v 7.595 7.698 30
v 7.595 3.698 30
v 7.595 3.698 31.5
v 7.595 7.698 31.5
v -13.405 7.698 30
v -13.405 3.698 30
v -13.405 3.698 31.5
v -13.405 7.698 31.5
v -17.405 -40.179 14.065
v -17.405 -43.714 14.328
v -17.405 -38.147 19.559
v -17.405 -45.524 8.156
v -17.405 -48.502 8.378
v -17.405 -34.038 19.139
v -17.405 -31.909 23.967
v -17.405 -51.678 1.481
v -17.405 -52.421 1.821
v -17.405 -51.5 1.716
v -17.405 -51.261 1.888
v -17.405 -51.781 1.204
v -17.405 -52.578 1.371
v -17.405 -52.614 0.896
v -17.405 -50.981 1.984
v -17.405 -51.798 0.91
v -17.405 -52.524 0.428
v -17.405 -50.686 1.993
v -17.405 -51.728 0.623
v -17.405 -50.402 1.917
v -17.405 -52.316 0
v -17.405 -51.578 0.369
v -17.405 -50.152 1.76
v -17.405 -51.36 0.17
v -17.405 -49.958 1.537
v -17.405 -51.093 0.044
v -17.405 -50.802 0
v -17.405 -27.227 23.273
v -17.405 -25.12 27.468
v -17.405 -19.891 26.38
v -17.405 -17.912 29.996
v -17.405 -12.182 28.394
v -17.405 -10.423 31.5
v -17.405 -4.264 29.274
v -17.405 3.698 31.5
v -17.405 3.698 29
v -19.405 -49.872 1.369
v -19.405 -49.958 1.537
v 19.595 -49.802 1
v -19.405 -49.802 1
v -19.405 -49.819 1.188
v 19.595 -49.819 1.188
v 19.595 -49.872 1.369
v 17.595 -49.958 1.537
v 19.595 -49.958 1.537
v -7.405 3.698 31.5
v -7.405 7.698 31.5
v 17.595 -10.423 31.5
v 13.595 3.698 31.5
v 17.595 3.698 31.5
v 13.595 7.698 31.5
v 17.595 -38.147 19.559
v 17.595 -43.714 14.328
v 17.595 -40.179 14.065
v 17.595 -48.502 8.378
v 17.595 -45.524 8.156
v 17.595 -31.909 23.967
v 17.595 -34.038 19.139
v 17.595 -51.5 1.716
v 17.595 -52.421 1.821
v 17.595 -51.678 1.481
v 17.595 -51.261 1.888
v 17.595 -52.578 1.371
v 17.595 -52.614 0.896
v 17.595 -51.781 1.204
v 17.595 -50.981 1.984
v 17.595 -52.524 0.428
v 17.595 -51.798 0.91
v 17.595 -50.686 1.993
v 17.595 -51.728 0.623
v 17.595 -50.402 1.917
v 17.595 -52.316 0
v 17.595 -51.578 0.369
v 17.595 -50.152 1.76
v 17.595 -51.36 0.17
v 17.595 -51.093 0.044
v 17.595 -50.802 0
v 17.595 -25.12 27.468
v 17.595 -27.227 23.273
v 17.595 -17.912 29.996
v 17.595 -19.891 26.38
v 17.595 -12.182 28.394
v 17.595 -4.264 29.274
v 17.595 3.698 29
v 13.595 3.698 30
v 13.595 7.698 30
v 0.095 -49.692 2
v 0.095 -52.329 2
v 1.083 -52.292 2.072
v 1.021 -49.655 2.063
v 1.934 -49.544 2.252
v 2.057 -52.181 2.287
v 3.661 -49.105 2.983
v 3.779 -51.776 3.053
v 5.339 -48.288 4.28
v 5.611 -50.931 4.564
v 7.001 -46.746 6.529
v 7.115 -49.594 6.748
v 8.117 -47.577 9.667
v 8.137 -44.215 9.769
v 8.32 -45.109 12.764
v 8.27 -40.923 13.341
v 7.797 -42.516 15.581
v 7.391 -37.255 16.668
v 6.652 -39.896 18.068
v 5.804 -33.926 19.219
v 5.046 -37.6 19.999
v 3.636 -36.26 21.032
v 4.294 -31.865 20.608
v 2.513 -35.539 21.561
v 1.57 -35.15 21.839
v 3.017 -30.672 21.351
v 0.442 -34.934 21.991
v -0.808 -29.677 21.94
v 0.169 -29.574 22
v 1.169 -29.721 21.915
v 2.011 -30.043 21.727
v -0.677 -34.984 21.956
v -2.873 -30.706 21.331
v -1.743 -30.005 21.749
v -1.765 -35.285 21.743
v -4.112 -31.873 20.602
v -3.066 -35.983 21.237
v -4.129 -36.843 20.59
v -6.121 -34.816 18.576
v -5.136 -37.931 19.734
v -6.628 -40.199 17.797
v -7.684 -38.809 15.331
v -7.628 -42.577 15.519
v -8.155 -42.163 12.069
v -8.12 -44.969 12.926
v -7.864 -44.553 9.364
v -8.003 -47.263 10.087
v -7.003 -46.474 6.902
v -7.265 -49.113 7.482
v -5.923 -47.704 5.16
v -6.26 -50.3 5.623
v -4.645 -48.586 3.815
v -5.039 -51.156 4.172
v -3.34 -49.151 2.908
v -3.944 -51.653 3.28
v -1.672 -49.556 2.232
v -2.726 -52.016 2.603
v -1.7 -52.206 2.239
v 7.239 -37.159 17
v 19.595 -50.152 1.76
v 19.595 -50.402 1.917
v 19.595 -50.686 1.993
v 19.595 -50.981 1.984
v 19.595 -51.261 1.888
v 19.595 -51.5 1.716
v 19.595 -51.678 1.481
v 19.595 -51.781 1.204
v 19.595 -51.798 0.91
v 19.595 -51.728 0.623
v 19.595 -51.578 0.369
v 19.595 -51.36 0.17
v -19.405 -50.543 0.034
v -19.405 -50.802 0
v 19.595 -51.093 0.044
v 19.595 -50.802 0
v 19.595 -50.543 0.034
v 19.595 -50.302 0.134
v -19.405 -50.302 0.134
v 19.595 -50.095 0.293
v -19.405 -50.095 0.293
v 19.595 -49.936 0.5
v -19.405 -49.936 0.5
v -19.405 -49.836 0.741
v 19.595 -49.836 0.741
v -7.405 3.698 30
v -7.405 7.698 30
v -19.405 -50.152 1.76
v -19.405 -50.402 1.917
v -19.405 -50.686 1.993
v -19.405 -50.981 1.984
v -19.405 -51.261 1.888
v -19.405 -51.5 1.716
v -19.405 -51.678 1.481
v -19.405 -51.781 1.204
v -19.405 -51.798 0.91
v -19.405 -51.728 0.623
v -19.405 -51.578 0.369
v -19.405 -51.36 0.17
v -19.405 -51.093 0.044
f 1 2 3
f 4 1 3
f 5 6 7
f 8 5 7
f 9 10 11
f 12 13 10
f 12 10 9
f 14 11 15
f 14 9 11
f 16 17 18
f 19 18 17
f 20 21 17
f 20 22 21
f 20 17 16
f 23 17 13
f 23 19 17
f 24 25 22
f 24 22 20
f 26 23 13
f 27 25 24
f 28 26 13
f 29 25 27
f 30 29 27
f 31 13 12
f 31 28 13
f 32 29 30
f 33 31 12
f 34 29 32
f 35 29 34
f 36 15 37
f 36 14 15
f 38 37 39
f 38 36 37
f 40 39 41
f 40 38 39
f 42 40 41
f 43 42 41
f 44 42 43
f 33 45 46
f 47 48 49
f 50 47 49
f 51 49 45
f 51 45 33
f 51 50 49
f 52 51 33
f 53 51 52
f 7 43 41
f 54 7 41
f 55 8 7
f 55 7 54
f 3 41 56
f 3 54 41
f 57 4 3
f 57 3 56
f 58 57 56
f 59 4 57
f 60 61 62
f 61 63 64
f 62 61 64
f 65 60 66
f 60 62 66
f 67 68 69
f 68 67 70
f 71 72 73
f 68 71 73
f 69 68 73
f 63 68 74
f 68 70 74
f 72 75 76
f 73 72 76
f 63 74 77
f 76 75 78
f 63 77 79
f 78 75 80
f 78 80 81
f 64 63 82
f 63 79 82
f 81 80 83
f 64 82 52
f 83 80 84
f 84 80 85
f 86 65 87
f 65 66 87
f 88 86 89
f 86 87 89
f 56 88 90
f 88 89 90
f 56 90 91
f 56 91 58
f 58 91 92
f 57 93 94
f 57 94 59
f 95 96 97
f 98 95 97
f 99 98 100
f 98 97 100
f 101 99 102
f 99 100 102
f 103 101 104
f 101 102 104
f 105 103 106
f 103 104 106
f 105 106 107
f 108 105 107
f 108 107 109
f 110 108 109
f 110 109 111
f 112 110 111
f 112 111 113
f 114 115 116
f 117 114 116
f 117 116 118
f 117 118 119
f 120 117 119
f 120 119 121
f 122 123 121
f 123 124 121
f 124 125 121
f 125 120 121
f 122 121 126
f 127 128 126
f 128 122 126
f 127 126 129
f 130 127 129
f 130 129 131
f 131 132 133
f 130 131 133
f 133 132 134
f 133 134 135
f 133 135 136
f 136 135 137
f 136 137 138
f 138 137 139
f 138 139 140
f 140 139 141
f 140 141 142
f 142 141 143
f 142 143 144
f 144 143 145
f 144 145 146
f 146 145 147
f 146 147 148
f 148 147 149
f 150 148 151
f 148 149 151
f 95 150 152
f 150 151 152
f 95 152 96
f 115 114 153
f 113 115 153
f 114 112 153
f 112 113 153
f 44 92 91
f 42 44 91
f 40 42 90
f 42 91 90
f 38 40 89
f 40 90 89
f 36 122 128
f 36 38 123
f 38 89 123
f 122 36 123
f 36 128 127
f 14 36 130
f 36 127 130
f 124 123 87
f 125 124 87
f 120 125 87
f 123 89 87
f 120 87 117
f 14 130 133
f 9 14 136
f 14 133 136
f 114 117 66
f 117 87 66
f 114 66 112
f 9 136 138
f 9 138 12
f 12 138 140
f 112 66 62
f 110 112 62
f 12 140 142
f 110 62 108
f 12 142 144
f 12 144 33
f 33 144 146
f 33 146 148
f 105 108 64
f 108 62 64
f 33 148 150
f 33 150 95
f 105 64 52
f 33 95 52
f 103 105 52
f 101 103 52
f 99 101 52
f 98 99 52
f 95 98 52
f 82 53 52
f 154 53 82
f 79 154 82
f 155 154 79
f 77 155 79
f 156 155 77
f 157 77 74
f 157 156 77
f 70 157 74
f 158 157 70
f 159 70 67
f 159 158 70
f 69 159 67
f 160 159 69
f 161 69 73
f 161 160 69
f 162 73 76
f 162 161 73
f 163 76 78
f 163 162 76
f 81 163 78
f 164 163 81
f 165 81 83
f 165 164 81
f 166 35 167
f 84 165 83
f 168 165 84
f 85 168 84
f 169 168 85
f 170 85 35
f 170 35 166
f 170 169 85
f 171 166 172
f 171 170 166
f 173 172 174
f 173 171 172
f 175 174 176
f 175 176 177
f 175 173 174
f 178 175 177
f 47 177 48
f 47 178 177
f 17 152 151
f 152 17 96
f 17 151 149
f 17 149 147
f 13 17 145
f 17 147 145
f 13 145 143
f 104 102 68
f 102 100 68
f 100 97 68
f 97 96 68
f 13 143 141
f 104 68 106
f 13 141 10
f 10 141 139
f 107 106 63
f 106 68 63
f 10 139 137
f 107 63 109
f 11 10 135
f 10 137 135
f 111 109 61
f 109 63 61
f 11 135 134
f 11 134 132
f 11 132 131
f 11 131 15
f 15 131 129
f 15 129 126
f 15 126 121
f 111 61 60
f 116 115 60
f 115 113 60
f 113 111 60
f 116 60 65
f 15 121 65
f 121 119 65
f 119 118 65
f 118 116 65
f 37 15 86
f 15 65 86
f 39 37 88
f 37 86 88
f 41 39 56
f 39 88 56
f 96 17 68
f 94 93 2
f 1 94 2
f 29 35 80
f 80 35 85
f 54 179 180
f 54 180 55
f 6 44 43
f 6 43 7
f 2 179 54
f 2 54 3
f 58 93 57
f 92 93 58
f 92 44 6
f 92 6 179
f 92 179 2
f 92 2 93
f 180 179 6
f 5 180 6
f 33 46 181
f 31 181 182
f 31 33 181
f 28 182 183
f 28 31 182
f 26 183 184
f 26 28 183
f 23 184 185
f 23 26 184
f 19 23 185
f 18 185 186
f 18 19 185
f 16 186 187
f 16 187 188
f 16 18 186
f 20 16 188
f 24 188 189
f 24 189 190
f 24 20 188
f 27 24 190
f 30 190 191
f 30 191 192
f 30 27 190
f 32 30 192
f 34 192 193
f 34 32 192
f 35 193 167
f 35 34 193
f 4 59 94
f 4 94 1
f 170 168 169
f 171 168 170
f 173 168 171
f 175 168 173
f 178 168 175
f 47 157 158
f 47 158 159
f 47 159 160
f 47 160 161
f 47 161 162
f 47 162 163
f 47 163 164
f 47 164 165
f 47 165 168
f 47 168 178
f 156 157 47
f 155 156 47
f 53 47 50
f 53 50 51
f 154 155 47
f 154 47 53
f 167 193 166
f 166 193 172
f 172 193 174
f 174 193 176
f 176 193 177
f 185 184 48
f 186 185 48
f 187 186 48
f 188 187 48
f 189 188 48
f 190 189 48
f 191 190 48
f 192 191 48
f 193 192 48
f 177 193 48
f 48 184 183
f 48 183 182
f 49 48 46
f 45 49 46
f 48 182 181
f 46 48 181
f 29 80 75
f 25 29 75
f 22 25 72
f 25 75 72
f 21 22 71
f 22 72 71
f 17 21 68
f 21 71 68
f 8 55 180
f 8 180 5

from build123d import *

# Parameters (mm, degrees)
F0_W          = 35
F0_H          = 57
F1_DEPTH      = 31.5
F4_DEPTH      = 57.001
F5_DEPTH      = 35.0010001
F7_DEPTH      = 35.0010001
F9_DEPTH      = 2
F9_DEPTH_BACK = 37
F11_DEPTH     = 37.001
F12_W         = 6
F12_H         = 2.5
F13_DEPTH     = 4
F14_DEPTH     = 1


with BuildPart() as f1:
    # F0 (on Top) → F1 (new body)
    with BuildSketch(Plane.XY):
        with Locations((0.0945744105, -24.8016776452)):
            Rectangle(F0_W, F0_H)
    extrude(amount=F1_DEPTH)

    # F3 (on face) → F4 (cut, through all)
    with BuildSketch(Plane.XZ.offset(53.3016776452)):
        with BuildLine():
            add(Edge.make_bspline(
                [(0.0945744105, 2), (14.3839935729, 2), (7.2392839917, 17), (0.0945744105, 32), (-7.0501351708, 17), (-14.194844752, 2), (0.0945744105, 2)],
                knots=[0, 0, 0, 2.0943951024, 2.0943951024, 4.1887902048, 4.1887902048, 6.2831853072, 6.2831853072, 6.2831853072], degree=2, weights=[1, 0.5, 1, 0.5, 1, 0.5, 1]))
        make_face()
    extrude(amount=-F4_DEPTH, mode=Mode.SUBTRACT)

    # F2 (on face) → F5 (cut, through all)
    with BuildSketch(Plane.YZ.offset(17.5945744105)):
        with BuildLine():
            ThreePointArc((-53.3016776452, 0), (-35.9248296563, 21.279893434), (-10.4231016291, 31.5))
            Line((-10.4231016291, 31.5), (-53.3016776452, 31.5))
            Line((-53.3016776452, 31.5), (-53.3016776452, 0))
        make_face()
    extrude(amount=-F5_DEPTH, mode=Mode.SUBTRACT)

    # F6 (on face) → F7 (cut, through all)
    with BuildSketch(Plane.YZ.offset(17.5945744105)):
        with BuildLine():
            Line((3.6983223548, 0), (3.6983223548, 29))
            ThreePointArc((3.6983223548, 29), (-28.0042777095, 22.8678173622), (-50.8016776452, 0))
            Line((-50.8016776452, 0), (3.6983223548, 0))
        make_face()
    extrude(amount=-F7_DEPTH, mode=Mode.SUBTRACT)

    # F8 (on face) → F9 (join, two sides)
    with BuildSketch(Plane.YZ.offset(17.5945744105)) as f9_sk:
        with BuildLine():
            ThreePointArc((-49.9582016017, 1.5371667936), (-51.6783665277, 1.4810577961), (-50.8016776452, 0))
            ThreePointArc((-50.8016776452, 0), (-50.3860655446, 0.7719448198), (-49.9582016017, 1.5371667936))
        make_face()
        with BuildLine():
            ThreePointArc((-49.9582016017, 1.5371667936), (-50.3860655446, 0.7719448198), (-50.8016776452, 0))
            ThreePointArc((-50.8016776452, 0), (-50.094570864, 0.2928932188), (-49.8016776452, 1))
            ThreePointArc((-49.8016776452, 1), (-49.8416057615, 1.2797534241), (-49.9582016017, 1.5371667936))
        make_face()
    extrude(amount=F9_DEPTH)
    extrude(f9_sk.sketch, amount=-F9_DEPTH_BACK)

    # F10 (on face) → F11 (cut, through all)
    with BuildSketch(Plane.YZ.offset(17.5945744105)):
        with BuildLine():
            Line((-53.3016776452, 0), (-52.3163572735, 0))
            ThreePointArc((-52.3163572735, 0), (-52.6137174082, 0.8962393447), (-52.4206060402, 1.8205639696))
            ThreePointArc((-52.4206060402, 1.8205639696), (-52.8695111773, 0.9143323688), (-53.3016776452, 0))
        make_face()
    extrude(amount=-F11_DEPTH, mode=Mode.SUBTRACT)

    # F12 (on face) → F13 (join)
    with BuildSketch(Plane(origin=(0, 3.6983223548, 0), x_dir=(-1, 0, 0), z_dir=(0, 1, 0))):
        with Locations((-10.5945744105, 30.25)):
            Rectangle(F12_W, F12_H)
        with Locations((10.4054255895, 30.25)):
            Rectangle(F12_W, F12_H)
    extrude(amount=F13_DEPTH)

    # F14 (cut): faces of the model
    f14_faces = [f1.faces().sort_by_distance(p)[0] for p in [
        (10.5945744105, 5.6983223548, 29),
        (-10.4054255895, 5.6983223548, 29),
    ]]
    extrude(f14_faces, amount=-F14_DEPTH, mode=Mode.SUBTRACT)


solid = f1.part
